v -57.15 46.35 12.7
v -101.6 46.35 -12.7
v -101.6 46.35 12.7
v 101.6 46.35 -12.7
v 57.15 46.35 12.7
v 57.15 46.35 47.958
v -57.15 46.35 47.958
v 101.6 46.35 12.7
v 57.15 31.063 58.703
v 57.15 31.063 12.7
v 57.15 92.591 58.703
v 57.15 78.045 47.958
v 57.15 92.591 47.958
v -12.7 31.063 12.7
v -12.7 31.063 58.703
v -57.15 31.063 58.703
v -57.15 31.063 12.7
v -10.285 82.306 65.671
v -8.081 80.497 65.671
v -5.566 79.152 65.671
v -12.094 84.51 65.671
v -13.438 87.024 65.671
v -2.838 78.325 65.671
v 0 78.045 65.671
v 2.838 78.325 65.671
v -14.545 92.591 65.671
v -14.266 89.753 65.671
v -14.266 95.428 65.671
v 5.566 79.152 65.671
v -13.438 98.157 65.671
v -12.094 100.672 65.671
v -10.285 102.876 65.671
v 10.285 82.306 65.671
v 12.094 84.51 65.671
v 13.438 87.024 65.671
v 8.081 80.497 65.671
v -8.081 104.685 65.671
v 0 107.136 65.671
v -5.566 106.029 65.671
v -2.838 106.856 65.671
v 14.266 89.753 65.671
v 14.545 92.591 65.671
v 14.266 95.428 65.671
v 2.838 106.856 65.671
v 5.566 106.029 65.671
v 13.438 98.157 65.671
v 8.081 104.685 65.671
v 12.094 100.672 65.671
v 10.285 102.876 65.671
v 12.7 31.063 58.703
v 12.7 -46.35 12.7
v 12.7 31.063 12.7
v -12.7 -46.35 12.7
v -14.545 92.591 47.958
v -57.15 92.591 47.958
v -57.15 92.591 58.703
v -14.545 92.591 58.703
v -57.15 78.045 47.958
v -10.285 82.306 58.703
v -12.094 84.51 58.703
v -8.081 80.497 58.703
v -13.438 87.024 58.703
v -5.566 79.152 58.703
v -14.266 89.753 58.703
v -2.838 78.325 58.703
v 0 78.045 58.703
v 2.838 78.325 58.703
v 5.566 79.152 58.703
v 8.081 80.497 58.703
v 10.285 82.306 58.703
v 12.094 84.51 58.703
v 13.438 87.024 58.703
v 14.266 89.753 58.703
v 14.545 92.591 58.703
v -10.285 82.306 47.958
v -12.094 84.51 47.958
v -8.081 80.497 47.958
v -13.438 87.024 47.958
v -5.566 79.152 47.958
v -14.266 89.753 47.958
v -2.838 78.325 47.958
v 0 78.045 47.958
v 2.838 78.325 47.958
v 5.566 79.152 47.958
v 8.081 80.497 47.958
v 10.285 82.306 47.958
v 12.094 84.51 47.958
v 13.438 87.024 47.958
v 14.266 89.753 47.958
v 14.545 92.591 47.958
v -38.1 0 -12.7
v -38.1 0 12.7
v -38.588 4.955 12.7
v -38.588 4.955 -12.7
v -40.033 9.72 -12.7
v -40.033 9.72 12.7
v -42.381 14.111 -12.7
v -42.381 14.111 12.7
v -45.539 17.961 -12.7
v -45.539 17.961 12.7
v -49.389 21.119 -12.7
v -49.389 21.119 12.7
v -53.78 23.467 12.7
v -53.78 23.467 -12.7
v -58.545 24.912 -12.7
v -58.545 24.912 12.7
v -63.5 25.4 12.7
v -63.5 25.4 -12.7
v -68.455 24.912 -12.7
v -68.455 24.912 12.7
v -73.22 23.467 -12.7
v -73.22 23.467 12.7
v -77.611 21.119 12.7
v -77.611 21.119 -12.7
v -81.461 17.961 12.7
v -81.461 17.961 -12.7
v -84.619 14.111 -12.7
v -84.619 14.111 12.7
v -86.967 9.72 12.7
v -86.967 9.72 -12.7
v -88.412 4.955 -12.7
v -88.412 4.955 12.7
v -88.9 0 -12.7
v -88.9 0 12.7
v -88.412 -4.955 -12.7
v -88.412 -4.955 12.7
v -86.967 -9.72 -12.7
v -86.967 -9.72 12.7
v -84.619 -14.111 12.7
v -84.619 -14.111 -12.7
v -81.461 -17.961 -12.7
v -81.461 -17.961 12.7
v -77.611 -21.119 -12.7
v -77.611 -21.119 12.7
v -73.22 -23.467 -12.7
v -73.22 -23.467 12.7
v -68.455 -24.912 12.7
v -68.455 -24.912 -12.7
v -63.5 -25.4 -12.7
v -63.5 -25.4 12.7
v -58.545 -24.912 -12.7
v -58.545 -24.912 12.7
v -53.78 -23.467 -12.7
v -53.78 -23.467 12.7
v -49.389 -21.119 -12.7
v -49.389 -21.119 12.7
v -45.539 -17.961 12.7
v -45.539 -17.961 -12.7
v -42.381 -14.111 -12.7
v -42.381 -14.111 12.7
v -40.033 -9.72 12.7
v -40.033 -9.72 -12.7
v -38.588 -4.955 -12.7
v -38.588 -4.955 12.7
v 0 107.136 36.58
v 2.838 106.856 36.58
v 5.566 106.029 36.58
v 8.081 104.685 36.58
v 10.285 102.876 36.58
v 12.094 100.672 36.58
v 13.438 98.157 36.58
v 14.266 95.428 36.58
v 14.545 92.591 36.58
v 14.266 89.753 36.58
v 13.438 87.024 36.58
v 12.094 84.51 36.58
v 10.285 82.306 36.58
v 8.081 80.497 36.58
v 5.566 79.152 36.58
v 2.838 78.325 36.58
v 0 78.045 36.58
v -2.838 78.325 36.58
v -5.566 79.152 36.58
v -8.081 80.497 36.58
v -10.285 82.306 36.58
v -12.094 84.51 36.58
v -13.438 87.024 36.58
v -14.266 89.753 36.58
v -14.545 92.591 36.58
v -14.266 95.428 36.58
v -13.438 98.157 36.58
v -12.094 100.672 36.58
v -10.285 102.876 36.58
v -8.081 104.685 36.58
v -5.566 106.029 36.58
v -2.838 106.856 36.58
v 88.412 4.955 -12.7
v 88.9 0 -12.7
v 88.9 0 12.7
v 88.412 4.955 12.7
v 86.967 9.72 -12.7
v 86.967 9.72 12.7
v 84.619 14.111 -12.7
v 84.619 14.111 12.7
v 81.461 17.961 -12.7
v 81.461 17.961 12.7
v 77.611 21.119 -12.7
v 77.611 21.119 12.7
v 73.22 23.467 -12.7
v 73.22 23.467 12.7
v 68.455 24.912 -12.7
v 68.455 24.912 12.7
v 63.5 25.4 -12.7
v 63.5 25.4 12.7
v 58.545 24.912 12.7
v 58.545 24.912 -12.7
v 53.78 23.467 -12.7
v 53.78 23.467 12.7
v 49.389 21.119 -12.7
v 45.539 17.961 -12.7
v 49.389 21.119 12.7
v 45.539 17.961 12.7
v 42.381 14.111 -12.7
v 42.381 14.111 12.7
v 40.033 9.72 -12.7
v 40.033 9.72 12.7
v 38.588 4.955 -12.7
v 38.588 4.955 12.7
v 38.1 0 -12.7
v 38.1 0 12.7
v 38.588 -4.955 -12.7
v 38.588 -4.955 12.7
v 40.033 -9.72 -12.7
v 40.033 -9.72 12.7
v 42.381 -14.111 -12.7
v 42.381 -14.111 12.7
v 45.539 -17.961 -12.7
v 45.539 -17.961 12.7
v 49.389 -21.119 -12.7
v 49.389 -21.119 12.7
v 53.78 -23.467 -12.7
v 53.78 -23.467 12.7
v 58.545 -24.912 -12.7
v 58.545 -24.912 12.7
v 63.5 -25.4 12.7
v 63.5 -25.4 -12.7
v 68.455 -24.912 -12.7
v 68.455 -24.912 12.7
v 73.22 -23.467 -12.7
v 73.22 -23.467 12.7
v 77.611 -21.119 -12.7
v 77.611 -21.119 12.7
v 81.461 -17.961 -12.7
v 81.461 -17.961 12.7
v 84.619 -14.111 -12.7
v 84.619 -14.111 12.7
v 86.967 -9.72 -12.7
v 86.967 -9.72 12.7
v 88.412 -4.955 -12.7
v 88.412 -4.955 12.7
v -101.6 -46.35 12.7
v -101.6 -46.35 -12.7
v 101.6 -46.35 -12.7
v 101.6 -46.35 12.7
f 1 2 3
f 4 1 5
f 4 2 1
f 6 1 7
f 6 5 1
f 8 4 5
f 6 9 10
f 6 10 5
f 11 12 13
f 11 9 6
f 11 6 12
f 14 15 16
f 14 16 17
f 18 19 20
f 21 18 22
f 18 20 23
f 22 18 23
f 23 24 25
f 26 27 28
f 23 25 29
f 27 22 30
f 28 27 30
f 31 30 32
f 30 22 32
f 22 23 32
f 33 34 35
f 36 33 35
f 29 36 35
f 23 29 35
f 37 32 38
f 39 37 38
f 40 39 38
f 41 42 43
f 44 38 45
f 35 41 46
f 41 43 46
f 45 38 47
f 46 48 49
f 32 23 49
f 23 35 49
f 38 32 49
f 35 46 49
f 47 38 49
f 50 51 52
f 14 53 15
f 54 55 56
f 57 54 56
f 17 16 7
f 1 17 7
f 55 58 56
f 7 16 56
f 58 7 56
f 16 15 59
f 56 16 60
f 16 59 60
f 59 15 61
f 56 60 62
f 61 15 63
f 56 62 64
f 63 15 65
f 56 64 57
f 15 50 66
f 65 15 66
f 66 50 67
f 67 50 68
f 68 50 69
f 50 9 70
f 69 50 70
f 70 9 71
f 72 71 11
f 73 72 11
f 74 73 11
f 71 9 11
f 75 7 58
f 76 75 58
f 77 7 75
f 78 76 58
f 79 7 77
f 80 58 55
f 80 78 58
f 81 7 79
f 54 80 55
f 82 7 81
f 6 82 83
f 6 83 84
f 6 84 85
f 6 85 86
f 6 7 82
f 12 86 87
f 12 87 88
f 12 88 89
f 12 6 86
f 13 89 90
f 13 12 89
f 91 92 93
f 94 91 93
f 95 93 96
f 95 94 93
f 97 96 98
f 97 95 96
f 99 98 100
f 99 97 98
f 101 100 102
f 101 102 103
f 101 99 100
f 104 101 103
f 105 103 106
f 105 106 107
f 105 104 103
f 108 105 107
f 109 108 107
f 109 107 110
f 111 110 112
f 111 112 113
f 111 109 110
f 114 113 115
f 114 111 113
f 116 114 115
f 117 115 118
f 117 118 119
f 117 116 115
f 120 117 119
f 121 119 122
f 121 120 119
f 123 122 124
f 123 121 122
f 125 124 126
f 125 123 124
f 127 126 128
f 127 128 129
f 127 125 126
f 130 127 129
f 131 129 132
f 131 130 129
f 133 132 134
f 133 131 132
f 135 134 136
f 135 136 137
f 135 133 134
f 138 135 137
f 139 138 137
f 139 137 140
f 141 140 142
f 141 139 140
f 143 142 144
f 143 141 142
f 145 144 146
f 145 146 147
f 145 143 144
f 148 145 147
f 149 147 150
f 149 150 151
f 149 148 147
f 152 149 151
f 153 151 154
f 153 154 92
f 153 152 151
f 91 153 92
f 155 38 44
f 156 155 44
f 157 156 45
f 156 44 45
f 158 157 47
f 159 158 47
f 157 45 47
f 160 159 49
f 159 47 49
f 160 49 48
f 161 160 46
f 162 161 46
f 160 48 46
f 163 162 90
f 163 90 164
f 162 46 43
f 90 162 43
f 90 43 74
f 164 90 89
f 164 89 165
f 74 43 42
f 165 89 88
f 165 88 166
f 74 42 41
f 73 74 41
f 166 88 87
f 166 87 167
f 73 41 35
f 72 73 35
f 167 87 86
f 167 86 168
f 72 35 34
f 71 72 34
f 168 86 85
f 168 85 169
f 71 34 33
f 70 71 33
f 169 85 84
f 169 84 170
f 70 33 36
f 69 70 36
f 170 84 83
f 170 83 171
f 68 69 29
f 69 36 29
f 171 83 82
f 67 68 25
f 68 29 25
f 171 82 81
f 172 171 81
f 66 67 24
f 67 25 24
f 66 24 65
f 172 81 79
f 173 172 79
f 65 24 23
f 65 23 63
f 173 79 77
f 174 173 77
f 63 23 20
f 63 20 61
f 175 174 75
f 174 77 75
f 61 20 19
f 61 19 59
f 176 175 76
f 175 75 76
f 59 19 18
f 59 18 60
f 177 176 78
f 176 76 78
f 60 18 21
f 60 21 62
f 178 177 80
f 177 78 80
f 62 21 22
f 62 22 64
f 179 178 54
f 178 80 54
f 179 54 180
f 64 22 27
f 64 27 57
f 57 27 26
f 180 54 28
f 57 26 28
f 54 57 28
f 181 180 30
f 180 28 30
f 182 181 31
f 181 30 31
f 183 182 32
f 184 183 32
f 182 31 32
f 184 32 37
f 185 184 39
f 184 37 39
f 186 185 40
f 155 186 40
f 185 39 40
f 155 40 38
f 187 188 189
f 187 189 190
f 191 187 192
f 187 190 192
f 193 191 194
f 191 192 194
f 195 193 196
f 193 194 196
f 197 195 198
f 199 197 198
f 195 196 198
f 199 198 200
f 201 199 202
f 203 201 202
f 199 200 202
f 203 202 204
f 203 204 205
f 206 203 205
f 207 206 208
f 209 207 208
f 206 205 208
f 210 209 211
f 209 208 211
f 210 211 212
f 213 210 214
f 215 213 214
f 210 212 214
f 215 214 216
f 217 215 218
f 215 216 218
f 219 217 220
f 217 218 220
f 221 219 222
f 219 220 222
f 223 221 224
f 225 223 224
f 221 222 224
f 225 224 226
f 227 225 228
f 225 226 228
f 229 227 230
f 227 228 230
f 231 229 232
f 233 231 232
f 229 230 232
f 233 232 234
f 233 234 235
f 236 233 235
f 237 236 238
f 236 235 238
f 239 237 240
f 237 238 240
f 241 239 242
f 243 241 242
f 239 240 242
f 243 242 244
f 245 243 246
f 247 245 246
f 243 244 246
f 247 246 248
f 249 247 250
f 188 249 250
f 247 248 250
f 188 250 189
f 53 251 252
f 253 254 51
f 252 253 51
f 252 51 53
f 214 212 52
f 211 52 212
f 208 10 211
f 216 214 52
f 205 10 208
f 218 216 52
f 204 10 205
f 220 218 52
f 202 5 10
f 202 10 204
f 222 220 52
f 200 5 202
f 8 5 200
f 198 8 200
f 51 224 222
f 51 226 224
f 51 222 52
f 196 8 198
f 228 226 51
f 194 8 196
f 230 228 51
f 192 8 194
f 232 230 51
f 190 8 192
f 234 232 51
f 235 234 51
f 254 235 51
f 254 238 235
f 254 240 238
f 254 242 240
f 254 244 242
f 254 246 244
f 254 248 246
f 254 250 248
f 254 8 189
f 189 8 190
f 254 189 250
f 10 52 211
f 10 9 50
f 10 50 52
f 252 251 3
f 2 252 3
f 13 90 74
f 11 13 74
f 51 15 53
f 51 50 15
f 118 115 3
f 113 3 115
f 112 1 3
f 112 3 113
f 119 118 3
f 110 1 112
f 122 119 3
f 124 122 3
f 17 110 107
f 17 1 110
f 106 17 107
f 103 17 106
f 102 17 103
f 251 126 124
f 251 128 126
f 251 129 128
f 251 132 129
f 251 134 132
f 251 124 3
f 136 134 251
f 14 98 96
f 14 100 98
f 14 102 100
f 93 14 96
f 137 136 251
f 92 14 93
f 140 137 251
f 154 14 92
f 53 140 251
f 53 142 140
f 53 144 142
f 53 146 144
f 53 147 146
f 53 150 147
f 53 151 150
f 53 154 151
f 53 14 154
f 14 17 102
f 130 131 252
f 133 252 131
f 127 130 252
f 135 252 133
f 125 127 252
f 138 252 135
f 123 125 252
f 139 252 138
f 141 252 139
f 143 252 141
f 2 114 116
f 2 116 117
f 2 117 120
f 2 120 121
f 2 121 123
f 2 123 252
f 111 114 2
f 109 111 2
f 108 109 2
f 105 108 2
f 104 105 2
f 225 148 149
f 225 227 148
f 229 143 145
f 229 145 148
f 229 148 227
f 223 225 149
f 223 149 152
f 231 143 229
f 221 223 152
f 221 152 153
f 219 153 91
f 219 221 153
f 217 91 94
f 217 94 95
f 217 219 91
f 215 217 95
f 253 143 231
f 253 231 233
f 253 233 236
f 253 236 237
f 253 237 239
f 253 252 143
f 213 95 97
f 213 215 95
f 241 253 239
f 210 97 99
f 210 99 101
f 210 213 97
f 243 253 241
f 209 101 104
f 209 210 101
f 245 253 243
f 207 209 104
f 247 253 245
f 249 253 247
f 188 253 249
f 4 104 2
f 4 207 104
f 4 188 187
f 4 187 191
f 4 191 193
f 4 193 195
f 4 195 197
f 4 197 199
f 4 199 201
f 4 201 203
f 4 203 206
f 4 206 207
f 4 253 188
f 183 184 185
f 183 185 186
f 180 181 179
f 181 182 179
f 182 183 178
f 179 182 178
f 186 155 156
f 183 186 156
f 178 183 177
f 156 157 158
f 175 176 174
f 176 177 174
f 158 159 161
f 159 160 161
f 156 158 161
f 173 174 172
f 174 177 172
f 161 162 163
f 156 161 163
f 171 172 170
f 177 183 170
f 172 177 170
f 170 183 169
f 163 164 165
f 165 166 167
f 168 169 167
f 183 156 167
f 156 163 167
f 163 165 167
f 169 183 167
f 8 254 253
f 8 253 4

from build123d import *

# Parameters (mm, degrees)
F1_DEPTH = 101.6
F2_DEPTH = 12.7
F3_DEPTH = 57.15
F0_W     = 14.5453011187
F0_H     = 10.745606224
F4_DEPTH = 57.15
F6_R     = 25.4
F7_DEPTH = 12.7


# Not quite as in the source:
# - a feature names something its author has since deleted; it is built from what else it names


with BuildPart() as f1:
    # F0 (on Right) → F1 (new body, symmetric)
    with BuildSketch(Plane.YZ):
        Polygon((31.0628309338, 12.7), (-46.3495767937, 12.7), (-46.3495767937, -12.7), (46.3495767937, -12.7), (46.3495767937, 12.7), align=None)
    extrude(amount=F1_DEPTH, both=True)

    # F0 (on Right) → F2 (join, symmetric)
    with BuildSketch(Plane.YZ):
        Polygon((31.0628309338, 58.703106785), (-46.3495767937, 12.7), (31.0628309338, 12.7), align=None)
    extrude(amount=F2_DEPTH, both=True)

    # F0 (on Right) → F3 (join, symmetric)
    with BuildSketch(Plane.YZ):
        Polygon((31.0628309338, 58.703106785), (31.0628309338, 12.7), (46.3495767937, 12.7), (46.3495767937, 47.9575005611), (78.0453036841, 47.9575005611), (78.0453036841, 58.703106785), align=None)
    extrude(amount=F3_DEPTH, both=True)

    # F0 (on Right) → F4 (join, symmetric)
    with BuildSketch(Plane.YZ):
        with Locations((85.3179542435, 53.330303673)):
            Rectangle(F0_W, F0_H)
    extrude(amount=F4_DEPTH, both=True)

    # F0 (on Right) → F5 (revolve)
    with BuildSketch(Plane.YZ):
        Polygon((92.5906048029, 65.6709397763), (92.5906048029, 58.703106785), (92.5906048029, 47.9575005611), (92.5906048029, 36.5803426697), (107.1359059216, 36.5803426697), (107.1359059216, 65.6709397763), align=None)
    revolve(axis=Axis((0, 92.5906048029, 51.125641223), (0, 0, -1)))

    # F6 (on Top) → F7 (cut, symmetric)
    with BuildSketch(Plane.XY):
        with Locations((-63.5, 0)):
            Circle(F6_R)
        with Locations((63.5, 0)):
            Circle(F6_R)
    extrude(amount=F7_DEPTH, both=True, mode=Mode.SUBTRACT)


solid = f1.part
